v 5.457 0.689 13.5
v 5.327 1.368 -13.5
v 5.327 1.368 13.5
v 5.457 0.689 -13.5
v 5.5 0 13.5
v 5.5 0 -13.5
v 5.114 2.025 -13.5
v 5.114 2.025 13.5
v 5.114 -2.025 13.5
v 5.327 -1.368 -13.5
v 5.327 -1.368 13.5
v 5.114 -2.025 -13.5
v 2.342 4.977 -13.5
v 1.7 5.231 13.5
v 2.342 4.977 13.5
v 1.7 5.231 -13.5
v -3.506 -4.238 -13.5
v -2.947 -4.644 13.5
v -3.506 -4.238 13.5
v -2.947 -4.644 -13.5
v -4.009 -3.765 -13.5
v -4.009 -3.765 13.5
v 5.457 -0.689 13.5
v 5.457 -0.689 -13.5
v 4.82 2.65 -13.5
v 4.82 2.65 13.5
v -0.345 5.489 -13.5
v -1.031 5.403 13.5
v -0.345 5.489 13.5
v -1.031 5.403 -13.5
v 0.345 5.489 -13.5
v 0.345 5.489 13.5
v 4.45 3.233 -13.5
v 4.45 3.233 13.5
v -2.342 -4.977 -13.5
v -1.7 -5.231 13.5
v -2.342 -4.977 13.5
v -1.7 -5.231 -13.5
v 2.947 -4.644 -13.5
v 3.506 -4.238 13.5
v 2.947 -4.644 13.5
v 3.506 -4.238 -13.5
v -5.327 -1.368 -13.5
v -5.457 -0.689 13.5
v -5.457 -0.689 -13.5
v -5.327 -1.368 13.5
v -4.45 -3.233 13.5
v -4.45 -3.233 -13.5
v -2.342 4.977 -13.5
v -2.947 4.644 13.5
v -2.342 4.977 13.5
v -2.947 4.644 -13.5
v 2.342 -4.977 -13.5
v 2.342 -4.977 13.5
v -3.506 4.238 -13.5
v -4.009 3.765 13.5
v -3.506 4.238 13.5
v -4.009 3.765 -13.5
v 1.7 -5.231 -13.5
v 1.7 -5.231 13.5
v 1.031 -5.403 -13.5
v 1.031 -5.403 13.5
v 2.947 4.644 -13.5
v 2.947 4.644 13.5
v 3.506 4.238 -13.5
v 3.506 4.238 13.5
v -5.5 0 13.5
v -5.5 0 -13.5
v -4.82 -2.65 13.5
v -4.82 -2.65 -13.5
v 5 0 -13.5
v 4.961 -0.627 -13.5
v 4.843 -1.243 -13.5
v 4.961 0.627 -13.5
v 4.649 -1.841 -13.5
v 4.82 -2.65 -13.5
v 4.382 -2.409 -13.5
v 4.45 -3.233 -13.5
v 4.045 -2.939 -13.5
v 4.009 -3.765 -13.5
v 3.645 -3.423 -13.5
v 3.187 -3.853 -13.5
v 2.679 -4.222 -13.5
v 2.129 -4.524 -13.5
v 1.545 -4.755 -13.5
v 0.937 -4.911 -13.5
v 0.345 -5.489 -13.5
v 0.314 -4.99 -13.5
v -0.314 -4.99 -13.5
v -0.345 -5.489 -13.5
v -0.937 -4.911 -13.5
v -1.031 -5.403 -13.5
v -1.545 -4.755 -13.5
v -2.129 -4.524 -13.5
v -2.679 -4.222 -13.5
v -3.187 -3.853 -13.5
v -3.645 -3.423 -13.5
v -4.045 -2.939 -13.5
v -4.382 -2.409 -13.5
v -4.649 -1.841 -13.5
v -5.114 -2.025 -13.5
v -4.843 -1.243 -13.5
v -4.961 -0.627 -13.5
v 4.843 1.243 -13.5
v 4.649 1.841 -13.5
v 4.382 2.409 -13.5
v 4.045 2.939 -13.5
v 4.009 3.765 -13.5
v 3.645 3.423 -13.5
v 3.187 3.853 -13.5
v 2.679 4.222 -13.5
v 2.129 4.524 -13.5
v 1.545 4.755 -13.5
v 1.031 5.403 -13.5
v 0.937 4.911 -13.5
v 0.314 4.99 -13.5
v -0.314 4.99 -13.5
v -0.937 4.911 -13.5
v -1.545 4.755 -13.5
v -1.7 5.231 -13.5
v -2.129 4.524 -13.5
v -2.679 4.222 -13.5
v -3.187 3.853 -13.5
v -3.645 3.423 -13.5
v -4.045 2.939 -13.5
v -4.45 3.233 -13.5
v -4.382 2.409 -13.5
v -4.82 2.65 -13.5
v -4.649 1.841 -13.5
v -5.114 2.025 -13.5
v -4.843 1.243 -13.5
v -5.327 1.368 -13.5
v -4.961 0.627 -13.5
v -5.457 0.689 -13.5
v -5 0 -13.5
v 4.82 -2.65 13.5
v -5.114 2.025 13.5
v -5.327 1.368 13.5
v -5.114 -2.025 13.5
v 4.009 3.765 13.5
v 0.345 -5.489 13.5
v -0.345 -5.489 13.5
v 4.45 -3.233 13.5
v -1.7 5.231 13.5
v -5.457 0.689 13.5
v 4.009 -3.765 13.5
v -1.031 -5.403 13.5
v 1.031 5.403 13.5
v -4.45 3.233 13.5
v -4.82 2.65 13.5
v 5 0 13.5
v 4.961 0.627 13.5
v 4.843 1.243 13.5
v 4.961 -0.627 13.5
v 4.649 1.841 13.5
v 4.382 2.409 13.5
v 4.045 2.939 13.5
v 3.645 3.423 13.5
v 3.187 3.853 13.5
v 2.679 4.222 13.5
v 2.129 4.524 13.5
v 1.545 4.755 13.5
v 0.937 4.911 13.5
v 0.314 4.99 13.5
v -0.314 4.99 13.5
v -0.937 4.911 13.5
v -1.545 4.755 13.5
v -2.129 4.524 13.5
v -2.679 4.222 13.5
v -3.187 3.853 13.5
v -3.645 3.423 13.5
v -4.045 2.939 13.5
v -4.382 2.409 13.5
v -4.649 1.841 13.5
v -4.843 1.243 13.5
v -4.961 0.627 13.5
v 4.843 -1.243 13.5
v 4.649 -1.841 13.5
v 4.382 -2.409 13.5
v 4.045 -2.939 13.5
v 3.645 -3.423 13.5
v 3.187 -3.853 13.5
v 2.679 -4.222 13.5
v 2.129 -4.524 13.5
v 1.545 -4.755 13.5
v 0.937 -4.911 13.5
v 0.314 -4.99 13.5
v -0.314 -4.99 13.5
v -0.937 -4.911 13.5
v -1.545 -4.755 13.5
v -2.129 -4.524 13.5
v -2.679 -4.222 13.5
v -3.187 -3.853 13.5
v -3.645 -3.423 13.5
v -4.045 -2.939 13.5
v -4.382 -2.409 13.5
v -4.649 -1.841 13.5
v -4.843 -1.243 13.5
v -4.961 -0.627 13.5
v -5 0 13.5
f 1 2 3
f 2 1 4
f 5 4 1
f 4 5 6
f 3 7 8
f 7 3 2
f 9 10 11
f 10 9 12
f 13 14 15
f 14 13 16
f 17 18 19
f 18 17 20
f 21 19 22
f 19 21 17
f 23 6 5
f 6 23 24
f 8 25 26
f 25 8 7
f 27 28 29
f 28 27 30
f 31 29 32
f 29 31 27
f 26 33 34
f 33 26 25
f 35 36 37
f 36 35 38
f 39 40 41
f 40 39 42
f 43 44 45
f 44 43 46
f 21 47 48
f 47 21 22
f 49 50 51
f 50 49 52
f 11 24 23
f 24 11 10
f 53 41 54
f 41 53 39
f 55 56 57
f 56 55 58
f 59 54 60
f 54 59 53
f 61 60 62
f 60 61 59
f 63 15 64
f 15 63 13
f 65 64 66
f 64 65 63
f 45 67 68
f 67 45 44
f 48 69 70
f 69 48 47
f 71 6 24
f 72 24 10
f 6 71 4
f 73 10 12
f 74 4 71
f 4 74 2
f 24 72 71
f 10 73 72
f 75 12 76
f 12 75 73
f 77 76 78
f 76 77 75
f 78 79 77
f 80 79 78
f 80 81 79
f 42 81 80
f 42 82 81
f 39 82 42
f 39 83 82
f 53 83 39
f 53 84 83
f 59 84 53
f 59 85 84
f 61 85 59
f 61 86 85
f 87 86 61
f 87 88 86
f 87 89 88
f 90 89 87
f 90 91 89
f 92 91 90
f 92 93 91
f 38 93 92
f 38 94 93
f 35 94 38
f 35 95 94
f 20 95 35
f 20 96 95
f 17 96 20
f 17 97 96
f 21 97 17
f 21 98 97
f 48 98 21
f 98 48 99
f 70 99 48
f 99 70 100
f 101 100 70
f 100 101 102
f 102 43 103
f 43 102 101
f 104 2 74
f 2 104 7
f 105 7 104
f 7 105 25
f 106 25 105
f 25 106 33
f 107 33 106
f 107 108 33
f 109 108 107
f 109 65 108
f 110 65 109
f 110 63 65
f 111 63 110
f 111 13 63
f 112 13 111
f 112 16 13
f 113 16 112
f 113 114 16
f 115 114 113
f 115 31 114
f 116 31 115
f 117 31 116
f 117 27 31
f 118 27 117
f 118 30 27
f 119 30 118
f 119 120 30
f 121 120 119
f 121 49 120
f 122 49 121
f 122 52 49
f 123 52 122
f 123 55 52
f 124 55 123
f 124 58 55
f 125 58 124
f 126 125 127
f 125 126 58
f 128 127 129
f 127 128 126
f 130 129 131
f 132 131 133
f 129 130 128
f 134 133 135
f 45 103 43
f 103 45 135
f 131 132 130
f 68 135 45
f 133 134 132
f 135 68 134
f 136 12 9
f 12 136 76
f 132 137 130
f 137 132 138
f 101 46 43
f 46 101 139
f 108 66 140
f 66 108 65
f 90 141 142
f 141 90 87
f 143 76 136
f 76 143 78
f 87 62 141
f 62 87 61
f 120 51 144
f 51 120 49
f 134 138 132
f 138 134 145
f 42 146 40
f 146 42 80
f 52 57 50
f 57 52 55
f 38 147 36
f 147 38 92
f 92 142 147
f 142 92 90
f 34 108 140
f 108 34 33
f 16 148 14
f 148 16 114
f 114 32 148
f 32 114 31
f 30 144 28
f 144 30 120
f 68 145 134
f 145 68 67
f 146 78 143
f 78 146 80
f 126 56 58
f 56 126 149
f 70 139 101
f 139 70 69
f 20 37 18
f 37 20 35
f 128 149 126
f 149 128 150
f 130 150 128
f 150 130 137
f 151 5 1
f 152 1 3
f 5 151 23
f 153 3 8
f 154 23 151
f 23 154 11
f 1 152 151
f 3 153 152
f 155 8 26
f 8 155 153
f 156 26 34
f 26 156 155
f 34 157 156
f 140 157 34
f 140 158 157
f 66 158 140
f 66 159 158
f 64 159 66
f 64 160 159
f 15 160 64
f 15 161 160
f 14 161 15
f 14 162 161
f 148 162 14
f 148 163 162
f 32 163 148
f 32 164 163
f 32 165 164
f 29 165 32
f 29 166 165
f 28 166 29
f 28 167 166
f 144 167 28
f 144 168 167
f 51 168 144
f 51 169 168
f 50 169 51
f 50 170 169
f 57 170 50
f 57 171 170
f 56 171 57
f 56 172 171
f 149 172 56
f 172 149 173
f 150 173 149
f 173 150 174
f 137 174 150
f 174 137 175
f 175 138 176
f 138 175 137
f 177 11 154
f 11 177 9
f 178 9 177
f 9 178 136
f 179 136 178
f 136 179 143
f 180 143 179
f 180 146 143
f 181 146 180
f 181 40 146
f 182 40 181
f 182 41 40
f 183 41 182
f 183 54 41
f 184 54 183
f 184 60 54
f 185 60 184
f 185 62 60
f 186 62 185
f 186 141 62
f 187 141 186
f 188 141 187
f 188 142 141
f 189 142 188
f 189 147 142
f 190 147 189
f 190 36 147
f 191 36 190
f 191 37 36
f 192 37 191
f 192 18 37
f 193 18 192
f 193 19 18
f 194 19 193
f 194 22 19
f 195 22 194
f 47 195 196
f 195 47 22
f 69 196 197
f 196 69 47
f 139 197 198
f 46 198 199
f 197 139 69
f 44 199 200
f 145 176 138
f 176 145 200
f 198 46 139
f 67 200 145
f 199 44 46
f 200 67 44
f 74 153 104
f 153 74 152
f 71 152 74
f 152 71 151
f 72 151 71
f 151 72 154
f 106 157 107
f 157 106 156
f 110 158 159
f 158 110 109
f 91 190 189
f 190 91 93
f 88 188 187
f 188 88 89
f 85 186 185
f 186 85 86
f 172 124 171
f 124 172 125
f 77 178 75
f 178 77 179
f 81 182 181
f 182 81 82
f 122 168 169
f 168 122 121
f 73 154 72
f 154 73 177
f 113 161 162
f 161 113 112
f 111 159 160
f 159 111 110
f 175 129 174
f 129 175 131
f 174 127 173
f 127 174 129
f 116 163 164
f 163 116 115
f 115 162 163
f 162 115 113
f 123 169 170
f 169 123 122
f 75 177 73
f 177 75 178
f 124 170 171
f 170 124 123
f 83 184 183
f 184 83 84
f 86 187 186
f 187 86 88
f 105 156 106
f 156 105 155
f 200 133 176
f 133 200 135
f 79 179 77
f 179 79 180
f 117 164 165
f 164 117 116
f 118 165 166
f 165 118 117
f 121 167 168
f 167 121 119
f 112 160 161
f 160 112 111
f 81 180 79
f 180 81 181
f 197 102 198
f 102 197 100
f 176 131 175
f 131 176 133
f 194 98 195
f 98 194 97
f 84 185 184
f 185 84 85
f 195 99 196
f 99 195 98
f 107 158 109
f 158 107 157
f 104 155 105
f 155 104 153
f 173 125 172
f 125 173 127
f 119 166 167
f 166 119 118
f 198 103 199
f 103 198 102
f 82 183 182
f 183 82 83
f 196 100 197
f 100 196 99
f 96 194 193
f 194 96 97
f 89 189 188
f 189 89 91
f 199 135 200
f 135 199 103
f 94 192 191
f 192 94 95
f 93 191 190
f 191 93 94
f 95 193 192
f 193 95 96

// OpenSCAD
$fn = 50;


difference() {
	union() {
		translate(v = [0, 0, -13.5000000000]) {
			cylinder(h = 27, r = 5.5000000000);
		}
	}
	union() {
		translate(v = [0, 0, -100.0000000000]) {
			cylinder(h = 200, r = 5.0000000000);
		}
	}
}
